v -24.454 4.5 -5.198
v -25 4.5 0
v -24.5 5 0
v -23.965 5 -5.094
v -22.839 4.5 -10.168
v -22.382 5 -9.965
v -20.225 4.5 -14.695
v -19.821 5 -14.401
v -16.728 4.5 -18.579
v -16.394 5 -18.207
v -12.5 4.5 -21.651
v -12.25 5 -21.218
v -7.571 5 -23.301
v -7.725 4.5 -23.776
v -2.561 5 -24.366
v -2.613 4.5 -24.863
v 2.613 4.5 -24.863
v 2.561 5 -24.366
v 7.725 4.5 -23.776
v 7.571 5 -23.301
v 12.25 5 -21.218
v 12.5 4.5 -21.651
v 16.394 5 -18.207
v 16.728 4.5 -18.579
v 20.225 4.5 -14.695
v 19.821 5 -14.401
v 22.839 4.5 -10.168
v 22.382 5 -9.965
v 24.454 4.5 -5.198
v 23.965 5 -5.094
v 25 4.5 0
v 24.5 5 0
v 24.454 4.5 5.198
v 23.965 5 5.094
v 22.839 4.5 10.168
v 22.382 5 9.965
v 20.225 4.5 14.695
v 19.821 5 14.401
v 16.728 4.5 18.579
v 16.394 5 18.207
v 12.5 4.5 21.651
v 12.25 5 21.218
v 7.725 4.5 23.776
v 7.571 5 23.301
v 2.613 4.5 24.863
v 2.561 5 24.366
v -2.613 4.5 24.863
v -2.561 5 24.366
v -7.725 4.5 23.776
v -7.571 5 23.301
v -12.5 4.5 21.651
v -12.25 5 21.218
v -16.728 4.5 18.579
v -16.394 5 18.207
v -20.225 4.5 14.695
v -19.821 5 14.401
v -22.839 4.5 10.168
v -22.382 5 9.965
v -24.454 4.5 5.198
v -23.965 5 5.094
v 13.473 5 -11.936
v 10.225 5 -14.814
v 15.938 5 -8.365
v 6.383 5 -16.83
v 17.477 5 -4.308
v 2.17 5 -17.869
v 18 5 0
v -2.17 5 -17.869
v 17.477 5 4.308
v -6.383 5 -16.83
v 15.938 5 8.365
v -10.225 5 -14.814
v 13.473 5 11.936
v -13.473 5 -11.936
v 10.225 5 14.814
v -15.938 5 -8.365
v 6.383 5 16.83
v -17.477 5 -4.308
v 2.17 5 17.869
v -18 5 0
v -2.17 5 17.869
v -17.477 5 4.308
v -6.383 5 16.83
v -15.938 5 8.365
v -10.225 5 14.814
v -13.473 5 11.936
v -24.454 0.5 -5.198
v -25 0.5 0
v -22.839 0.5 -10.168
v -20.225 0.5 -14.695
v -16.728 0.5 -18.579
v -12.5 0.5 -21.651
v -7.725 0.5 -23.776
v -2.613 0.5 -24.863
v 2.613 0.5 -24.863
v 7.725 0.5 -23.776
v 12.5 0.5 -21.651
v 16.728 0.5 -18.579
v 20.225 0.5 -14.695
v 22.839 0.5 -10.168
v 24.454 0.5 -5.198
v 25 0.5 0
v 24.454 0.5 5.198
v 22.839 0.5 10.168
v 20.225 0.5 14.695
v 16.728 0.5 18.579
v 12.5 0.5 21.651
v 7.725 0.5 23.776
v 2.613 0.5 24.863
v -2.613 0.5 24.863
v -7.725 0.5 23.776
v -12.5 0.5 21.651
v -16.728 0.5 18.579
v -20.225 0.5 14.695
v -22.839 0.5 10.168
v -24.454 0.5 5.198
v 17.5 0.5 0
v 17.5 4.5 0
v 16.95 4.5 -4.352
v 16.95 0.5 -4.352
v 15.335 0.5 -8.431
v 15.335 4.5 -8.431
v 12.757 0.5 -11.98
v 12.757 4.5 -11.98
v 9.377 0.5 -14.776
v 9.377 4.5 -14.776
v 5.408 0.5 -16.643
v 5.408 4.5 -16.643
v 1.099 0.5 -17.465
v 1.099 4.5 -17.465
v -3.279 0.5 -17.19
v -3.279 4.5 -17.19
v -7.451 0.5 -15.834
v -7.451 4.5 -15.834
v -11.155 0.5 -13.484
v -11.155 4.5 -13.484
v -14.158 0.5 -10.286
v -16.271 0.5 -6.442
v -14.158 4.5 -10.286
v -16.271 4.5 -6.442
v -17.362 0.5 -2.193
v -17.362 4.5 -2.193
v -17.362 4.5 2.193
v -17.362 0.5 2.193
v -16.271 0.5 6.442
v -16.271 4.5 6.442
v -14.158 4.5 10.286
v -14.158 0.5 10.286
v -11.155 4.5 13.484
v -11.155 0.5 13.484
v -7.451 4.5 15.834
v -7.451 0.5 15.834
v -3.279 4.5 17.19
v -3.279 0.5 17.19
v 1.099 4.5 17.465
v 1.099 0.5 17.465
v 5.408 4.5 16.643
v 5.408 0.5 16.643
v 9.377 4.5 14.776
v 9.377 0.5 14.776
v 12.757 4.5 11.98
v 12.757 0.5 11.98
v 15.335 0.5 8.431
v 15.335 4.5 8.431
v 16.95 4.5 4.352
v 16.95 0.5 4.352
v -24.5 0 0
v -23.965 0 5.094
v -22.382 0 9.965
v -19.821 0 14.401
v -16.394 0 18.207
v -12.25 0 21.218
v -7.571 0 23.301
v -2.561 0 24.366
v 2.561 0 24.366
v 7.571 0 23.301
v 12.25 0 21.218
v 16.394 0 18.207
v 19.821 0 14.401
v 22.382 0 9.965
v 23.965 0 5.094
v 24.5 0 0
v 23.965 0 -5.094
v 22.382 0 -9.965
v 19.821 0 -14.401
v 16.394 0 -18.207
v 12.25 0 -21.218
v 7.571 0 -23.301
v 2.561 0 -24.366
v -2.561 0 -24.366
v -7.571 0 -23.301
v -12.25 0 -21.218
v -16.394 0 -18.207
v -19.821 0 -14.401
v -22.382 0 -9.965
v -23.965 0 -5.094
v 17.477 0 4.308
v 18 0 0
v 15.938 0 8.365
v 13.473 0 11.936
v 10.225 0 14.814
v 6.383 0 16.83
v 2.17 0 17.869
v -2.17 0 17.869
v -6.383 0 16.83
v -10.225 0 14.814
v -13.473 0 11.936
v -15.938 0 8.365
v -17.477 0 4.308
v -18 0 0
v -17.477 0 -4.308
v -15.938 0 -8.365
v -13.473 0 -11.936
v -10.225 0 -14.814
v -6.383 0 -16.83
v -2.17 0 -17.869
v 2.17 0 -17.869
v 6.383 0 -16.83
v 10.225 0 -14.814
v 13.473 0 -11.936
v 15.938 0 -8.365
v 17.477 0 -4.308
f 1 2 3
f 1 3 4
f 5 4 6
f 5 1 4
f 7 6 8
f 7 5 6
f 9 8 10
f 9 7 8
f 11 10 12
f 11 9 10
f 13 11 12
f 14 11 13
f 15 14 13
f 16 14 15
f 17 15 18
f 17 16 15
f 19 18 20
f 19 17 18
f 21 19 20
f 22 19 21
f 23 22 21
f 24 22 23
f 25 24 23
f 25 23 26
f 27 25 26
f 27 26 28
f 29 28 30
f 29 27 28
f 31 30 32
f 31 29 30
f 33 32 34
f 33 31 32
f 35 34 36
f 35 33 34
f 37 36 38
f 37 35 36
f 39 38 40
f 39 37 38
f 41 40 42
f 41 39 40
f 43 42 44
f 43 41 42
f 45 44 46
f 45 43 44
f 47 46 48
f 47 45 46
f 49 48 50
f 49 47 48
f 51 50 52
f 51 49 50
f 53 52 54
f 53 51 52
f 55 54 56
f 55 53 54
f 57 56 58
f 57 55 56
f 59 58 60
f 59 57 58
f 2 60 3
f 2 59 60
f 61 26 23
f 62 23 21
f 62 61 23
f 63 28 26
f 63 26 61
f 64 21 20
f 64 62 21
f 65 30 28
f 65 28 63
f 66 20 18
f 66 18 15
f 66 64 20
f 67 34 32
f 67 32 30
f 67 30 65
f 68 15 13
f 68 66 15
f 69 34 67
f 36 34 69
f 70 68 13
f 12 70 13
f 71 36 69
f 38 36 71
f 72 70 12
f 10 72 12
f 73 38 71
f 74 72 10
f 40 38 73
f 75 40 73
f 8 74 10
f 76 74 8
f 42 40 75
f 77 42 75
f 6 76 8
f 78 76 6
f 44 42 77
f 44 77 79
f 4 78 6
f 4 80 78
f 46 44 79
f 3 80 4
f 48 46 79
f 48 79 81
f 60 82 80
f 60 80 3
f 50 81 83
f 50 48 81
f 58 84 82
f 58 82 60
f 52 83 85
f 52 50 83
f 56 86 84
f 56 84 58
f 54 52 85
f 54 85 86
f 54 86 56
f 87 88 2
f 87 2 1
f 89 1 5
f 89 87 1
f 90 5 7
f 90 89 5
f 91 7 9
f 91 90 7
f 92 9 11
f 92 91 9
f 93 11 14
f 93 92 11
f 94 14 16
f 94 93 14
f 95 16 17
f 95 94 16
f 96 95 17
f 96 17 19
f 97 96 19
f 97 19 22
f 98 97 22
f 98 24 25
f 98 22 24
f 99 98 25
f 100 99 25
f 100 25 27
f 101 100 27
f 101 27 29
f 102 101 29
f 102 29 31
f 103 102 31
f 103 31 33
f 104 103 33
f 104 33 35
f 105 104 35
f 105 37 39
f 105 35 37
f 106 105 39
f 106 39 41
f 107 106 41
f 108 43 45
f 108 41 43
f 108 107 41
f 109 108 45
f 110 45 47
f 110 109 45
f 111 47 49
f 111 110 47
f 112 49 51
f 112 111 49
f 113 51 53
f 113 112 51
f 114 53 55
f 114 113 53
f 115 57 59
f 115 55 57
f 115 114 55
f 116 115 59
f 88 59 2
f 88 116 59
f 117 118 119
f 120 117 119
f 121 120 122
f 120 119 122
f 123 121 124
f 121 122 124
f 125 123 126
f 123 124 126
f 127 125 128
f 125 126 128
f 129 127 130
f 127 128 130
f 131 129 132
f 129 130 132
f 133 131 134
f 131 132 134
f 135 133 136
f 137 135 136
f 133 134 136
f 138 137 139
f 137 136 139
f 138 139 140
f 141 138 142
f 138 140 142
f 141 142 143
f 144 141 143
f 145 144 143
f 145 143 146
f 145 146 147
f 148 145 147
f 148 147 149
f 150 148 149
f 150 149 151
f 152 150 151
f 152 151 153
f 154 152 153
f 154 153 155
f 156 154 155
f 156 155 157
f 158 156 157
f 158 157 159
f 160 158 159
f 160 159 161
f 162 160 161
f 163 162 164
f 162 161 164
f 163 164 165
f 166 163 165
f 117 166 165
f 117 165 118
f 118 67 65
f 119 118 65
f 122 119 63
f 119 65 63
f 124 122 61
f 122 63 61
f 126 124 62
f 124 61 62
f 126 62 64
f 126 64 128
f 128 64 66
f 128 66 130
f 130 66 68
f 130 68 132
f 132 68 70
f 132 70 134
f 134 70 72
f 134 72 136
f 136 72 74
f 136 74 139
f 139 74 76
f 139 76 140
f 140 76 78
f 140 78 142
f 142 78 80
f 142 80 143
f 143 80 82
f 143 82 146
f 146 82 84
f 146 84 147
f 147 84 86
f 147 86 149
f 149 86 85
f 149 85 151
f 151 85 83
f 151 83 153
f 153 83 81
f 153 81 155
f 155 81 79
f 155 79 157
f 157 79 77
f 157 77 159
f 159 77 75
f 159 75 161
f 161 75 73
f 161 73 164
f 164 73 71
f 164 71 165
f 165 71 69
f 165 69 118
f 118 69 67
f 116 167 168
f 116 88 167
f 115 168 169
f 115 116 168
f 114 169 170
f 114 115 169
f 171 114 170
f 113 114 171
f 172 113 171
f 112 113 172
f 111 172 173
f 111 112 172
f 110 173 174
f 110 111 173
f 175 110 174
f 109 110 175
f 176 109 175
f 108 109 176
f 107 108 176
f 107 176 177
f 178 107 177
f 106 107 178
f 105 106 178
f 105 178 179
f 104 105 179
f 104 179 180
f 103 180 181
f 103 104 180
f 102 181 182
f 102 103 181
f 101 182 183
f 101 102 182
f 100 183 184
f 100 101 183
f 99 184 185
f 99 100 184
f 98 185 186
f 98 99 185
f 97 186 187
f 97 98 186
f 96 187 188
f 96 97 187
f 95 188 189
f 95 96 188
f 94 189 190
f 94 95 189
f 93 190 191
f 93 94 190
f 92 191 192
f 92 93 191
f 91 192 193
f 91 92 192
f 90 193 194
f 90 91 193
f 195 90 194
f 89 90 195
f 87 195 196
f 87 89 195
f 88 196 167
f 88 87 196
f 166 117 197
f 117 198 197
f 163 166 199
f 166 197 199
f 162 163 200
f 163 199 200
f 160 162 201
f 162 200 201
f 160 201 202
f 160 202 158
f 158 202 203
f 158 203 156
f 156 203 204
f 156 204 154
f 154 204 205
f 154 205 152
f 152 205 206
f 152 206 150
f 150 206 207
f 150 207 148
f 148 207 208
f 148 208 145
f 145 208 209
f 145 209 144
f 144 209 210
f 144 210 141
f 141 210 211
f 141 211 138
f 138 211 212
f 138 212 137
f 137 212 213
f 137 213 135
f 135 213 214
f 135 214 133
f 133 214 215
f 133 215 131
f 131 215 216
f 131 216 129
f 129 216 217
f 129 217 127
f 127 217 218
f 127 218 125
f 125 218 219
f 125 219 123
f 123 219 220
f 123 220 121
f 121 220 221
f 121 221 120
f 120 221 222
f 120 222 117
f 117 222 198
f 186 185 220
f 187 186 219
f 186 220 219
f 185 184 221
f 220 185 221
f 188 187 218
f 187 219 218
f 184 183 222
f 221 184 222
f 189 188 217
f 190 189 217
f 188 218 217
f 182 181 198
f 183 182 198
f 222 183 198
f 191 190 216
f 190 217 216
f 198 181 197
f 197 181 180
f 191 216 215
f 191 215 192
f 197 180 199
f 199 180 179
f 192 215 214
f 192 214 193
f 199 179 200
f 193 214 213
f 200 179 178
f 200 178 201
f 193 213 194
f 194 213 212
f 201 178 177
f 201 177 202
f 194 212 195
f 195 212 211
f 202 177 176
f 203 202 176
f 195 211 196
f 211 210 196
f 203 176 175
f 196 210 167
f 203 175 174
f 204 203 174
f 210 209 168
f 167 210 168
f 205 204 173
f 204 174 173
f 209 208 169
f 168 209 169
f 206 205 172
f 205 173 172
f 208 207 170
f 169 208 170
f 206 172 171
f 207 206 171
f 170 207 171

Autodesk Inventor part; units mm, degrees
ref_plane "YZ Plane" through (0, 0, 0) normal (1, 0, 0) x (0, 1, 0)
ref_plane "XZ Plane" through (0, 0, 0) normal (0, 1, 0) x (-1, 0, 0)
ref_plane "XY Plane" through (0, 0, 0) normal (0, 0, 1) x (1, 0, 0)
sketch "スケッチ1" plane through (0, 0, 0) normal (0, 1, 0) x (-1, 0, 0)
  circle A0 centre (0, 0) radius 25
  dimension "d0" = 50
extrude "押し出し1" add sketch "スケッチ1" along normal blind 5
sketch "スケッチ4" plane through (0, 5, 0) normal (0, 1, 0) x (1, 0, 0)
  circle A0 centre (0, 0) radius 17.5
  dimension "d9" = 35
extrude "押し出し4" cut sketch "スケッチ4" against normal through all
chamfer "面取り2" distance 0.5 angle 45 4 edges at (25, 5, 0) (-17.5, 5, 0) (-17.5, 0, 0) (25, 0, 0)
properties part number "B_probe_bearing_clamp_without_holes" material "PAEK 樹脂"
